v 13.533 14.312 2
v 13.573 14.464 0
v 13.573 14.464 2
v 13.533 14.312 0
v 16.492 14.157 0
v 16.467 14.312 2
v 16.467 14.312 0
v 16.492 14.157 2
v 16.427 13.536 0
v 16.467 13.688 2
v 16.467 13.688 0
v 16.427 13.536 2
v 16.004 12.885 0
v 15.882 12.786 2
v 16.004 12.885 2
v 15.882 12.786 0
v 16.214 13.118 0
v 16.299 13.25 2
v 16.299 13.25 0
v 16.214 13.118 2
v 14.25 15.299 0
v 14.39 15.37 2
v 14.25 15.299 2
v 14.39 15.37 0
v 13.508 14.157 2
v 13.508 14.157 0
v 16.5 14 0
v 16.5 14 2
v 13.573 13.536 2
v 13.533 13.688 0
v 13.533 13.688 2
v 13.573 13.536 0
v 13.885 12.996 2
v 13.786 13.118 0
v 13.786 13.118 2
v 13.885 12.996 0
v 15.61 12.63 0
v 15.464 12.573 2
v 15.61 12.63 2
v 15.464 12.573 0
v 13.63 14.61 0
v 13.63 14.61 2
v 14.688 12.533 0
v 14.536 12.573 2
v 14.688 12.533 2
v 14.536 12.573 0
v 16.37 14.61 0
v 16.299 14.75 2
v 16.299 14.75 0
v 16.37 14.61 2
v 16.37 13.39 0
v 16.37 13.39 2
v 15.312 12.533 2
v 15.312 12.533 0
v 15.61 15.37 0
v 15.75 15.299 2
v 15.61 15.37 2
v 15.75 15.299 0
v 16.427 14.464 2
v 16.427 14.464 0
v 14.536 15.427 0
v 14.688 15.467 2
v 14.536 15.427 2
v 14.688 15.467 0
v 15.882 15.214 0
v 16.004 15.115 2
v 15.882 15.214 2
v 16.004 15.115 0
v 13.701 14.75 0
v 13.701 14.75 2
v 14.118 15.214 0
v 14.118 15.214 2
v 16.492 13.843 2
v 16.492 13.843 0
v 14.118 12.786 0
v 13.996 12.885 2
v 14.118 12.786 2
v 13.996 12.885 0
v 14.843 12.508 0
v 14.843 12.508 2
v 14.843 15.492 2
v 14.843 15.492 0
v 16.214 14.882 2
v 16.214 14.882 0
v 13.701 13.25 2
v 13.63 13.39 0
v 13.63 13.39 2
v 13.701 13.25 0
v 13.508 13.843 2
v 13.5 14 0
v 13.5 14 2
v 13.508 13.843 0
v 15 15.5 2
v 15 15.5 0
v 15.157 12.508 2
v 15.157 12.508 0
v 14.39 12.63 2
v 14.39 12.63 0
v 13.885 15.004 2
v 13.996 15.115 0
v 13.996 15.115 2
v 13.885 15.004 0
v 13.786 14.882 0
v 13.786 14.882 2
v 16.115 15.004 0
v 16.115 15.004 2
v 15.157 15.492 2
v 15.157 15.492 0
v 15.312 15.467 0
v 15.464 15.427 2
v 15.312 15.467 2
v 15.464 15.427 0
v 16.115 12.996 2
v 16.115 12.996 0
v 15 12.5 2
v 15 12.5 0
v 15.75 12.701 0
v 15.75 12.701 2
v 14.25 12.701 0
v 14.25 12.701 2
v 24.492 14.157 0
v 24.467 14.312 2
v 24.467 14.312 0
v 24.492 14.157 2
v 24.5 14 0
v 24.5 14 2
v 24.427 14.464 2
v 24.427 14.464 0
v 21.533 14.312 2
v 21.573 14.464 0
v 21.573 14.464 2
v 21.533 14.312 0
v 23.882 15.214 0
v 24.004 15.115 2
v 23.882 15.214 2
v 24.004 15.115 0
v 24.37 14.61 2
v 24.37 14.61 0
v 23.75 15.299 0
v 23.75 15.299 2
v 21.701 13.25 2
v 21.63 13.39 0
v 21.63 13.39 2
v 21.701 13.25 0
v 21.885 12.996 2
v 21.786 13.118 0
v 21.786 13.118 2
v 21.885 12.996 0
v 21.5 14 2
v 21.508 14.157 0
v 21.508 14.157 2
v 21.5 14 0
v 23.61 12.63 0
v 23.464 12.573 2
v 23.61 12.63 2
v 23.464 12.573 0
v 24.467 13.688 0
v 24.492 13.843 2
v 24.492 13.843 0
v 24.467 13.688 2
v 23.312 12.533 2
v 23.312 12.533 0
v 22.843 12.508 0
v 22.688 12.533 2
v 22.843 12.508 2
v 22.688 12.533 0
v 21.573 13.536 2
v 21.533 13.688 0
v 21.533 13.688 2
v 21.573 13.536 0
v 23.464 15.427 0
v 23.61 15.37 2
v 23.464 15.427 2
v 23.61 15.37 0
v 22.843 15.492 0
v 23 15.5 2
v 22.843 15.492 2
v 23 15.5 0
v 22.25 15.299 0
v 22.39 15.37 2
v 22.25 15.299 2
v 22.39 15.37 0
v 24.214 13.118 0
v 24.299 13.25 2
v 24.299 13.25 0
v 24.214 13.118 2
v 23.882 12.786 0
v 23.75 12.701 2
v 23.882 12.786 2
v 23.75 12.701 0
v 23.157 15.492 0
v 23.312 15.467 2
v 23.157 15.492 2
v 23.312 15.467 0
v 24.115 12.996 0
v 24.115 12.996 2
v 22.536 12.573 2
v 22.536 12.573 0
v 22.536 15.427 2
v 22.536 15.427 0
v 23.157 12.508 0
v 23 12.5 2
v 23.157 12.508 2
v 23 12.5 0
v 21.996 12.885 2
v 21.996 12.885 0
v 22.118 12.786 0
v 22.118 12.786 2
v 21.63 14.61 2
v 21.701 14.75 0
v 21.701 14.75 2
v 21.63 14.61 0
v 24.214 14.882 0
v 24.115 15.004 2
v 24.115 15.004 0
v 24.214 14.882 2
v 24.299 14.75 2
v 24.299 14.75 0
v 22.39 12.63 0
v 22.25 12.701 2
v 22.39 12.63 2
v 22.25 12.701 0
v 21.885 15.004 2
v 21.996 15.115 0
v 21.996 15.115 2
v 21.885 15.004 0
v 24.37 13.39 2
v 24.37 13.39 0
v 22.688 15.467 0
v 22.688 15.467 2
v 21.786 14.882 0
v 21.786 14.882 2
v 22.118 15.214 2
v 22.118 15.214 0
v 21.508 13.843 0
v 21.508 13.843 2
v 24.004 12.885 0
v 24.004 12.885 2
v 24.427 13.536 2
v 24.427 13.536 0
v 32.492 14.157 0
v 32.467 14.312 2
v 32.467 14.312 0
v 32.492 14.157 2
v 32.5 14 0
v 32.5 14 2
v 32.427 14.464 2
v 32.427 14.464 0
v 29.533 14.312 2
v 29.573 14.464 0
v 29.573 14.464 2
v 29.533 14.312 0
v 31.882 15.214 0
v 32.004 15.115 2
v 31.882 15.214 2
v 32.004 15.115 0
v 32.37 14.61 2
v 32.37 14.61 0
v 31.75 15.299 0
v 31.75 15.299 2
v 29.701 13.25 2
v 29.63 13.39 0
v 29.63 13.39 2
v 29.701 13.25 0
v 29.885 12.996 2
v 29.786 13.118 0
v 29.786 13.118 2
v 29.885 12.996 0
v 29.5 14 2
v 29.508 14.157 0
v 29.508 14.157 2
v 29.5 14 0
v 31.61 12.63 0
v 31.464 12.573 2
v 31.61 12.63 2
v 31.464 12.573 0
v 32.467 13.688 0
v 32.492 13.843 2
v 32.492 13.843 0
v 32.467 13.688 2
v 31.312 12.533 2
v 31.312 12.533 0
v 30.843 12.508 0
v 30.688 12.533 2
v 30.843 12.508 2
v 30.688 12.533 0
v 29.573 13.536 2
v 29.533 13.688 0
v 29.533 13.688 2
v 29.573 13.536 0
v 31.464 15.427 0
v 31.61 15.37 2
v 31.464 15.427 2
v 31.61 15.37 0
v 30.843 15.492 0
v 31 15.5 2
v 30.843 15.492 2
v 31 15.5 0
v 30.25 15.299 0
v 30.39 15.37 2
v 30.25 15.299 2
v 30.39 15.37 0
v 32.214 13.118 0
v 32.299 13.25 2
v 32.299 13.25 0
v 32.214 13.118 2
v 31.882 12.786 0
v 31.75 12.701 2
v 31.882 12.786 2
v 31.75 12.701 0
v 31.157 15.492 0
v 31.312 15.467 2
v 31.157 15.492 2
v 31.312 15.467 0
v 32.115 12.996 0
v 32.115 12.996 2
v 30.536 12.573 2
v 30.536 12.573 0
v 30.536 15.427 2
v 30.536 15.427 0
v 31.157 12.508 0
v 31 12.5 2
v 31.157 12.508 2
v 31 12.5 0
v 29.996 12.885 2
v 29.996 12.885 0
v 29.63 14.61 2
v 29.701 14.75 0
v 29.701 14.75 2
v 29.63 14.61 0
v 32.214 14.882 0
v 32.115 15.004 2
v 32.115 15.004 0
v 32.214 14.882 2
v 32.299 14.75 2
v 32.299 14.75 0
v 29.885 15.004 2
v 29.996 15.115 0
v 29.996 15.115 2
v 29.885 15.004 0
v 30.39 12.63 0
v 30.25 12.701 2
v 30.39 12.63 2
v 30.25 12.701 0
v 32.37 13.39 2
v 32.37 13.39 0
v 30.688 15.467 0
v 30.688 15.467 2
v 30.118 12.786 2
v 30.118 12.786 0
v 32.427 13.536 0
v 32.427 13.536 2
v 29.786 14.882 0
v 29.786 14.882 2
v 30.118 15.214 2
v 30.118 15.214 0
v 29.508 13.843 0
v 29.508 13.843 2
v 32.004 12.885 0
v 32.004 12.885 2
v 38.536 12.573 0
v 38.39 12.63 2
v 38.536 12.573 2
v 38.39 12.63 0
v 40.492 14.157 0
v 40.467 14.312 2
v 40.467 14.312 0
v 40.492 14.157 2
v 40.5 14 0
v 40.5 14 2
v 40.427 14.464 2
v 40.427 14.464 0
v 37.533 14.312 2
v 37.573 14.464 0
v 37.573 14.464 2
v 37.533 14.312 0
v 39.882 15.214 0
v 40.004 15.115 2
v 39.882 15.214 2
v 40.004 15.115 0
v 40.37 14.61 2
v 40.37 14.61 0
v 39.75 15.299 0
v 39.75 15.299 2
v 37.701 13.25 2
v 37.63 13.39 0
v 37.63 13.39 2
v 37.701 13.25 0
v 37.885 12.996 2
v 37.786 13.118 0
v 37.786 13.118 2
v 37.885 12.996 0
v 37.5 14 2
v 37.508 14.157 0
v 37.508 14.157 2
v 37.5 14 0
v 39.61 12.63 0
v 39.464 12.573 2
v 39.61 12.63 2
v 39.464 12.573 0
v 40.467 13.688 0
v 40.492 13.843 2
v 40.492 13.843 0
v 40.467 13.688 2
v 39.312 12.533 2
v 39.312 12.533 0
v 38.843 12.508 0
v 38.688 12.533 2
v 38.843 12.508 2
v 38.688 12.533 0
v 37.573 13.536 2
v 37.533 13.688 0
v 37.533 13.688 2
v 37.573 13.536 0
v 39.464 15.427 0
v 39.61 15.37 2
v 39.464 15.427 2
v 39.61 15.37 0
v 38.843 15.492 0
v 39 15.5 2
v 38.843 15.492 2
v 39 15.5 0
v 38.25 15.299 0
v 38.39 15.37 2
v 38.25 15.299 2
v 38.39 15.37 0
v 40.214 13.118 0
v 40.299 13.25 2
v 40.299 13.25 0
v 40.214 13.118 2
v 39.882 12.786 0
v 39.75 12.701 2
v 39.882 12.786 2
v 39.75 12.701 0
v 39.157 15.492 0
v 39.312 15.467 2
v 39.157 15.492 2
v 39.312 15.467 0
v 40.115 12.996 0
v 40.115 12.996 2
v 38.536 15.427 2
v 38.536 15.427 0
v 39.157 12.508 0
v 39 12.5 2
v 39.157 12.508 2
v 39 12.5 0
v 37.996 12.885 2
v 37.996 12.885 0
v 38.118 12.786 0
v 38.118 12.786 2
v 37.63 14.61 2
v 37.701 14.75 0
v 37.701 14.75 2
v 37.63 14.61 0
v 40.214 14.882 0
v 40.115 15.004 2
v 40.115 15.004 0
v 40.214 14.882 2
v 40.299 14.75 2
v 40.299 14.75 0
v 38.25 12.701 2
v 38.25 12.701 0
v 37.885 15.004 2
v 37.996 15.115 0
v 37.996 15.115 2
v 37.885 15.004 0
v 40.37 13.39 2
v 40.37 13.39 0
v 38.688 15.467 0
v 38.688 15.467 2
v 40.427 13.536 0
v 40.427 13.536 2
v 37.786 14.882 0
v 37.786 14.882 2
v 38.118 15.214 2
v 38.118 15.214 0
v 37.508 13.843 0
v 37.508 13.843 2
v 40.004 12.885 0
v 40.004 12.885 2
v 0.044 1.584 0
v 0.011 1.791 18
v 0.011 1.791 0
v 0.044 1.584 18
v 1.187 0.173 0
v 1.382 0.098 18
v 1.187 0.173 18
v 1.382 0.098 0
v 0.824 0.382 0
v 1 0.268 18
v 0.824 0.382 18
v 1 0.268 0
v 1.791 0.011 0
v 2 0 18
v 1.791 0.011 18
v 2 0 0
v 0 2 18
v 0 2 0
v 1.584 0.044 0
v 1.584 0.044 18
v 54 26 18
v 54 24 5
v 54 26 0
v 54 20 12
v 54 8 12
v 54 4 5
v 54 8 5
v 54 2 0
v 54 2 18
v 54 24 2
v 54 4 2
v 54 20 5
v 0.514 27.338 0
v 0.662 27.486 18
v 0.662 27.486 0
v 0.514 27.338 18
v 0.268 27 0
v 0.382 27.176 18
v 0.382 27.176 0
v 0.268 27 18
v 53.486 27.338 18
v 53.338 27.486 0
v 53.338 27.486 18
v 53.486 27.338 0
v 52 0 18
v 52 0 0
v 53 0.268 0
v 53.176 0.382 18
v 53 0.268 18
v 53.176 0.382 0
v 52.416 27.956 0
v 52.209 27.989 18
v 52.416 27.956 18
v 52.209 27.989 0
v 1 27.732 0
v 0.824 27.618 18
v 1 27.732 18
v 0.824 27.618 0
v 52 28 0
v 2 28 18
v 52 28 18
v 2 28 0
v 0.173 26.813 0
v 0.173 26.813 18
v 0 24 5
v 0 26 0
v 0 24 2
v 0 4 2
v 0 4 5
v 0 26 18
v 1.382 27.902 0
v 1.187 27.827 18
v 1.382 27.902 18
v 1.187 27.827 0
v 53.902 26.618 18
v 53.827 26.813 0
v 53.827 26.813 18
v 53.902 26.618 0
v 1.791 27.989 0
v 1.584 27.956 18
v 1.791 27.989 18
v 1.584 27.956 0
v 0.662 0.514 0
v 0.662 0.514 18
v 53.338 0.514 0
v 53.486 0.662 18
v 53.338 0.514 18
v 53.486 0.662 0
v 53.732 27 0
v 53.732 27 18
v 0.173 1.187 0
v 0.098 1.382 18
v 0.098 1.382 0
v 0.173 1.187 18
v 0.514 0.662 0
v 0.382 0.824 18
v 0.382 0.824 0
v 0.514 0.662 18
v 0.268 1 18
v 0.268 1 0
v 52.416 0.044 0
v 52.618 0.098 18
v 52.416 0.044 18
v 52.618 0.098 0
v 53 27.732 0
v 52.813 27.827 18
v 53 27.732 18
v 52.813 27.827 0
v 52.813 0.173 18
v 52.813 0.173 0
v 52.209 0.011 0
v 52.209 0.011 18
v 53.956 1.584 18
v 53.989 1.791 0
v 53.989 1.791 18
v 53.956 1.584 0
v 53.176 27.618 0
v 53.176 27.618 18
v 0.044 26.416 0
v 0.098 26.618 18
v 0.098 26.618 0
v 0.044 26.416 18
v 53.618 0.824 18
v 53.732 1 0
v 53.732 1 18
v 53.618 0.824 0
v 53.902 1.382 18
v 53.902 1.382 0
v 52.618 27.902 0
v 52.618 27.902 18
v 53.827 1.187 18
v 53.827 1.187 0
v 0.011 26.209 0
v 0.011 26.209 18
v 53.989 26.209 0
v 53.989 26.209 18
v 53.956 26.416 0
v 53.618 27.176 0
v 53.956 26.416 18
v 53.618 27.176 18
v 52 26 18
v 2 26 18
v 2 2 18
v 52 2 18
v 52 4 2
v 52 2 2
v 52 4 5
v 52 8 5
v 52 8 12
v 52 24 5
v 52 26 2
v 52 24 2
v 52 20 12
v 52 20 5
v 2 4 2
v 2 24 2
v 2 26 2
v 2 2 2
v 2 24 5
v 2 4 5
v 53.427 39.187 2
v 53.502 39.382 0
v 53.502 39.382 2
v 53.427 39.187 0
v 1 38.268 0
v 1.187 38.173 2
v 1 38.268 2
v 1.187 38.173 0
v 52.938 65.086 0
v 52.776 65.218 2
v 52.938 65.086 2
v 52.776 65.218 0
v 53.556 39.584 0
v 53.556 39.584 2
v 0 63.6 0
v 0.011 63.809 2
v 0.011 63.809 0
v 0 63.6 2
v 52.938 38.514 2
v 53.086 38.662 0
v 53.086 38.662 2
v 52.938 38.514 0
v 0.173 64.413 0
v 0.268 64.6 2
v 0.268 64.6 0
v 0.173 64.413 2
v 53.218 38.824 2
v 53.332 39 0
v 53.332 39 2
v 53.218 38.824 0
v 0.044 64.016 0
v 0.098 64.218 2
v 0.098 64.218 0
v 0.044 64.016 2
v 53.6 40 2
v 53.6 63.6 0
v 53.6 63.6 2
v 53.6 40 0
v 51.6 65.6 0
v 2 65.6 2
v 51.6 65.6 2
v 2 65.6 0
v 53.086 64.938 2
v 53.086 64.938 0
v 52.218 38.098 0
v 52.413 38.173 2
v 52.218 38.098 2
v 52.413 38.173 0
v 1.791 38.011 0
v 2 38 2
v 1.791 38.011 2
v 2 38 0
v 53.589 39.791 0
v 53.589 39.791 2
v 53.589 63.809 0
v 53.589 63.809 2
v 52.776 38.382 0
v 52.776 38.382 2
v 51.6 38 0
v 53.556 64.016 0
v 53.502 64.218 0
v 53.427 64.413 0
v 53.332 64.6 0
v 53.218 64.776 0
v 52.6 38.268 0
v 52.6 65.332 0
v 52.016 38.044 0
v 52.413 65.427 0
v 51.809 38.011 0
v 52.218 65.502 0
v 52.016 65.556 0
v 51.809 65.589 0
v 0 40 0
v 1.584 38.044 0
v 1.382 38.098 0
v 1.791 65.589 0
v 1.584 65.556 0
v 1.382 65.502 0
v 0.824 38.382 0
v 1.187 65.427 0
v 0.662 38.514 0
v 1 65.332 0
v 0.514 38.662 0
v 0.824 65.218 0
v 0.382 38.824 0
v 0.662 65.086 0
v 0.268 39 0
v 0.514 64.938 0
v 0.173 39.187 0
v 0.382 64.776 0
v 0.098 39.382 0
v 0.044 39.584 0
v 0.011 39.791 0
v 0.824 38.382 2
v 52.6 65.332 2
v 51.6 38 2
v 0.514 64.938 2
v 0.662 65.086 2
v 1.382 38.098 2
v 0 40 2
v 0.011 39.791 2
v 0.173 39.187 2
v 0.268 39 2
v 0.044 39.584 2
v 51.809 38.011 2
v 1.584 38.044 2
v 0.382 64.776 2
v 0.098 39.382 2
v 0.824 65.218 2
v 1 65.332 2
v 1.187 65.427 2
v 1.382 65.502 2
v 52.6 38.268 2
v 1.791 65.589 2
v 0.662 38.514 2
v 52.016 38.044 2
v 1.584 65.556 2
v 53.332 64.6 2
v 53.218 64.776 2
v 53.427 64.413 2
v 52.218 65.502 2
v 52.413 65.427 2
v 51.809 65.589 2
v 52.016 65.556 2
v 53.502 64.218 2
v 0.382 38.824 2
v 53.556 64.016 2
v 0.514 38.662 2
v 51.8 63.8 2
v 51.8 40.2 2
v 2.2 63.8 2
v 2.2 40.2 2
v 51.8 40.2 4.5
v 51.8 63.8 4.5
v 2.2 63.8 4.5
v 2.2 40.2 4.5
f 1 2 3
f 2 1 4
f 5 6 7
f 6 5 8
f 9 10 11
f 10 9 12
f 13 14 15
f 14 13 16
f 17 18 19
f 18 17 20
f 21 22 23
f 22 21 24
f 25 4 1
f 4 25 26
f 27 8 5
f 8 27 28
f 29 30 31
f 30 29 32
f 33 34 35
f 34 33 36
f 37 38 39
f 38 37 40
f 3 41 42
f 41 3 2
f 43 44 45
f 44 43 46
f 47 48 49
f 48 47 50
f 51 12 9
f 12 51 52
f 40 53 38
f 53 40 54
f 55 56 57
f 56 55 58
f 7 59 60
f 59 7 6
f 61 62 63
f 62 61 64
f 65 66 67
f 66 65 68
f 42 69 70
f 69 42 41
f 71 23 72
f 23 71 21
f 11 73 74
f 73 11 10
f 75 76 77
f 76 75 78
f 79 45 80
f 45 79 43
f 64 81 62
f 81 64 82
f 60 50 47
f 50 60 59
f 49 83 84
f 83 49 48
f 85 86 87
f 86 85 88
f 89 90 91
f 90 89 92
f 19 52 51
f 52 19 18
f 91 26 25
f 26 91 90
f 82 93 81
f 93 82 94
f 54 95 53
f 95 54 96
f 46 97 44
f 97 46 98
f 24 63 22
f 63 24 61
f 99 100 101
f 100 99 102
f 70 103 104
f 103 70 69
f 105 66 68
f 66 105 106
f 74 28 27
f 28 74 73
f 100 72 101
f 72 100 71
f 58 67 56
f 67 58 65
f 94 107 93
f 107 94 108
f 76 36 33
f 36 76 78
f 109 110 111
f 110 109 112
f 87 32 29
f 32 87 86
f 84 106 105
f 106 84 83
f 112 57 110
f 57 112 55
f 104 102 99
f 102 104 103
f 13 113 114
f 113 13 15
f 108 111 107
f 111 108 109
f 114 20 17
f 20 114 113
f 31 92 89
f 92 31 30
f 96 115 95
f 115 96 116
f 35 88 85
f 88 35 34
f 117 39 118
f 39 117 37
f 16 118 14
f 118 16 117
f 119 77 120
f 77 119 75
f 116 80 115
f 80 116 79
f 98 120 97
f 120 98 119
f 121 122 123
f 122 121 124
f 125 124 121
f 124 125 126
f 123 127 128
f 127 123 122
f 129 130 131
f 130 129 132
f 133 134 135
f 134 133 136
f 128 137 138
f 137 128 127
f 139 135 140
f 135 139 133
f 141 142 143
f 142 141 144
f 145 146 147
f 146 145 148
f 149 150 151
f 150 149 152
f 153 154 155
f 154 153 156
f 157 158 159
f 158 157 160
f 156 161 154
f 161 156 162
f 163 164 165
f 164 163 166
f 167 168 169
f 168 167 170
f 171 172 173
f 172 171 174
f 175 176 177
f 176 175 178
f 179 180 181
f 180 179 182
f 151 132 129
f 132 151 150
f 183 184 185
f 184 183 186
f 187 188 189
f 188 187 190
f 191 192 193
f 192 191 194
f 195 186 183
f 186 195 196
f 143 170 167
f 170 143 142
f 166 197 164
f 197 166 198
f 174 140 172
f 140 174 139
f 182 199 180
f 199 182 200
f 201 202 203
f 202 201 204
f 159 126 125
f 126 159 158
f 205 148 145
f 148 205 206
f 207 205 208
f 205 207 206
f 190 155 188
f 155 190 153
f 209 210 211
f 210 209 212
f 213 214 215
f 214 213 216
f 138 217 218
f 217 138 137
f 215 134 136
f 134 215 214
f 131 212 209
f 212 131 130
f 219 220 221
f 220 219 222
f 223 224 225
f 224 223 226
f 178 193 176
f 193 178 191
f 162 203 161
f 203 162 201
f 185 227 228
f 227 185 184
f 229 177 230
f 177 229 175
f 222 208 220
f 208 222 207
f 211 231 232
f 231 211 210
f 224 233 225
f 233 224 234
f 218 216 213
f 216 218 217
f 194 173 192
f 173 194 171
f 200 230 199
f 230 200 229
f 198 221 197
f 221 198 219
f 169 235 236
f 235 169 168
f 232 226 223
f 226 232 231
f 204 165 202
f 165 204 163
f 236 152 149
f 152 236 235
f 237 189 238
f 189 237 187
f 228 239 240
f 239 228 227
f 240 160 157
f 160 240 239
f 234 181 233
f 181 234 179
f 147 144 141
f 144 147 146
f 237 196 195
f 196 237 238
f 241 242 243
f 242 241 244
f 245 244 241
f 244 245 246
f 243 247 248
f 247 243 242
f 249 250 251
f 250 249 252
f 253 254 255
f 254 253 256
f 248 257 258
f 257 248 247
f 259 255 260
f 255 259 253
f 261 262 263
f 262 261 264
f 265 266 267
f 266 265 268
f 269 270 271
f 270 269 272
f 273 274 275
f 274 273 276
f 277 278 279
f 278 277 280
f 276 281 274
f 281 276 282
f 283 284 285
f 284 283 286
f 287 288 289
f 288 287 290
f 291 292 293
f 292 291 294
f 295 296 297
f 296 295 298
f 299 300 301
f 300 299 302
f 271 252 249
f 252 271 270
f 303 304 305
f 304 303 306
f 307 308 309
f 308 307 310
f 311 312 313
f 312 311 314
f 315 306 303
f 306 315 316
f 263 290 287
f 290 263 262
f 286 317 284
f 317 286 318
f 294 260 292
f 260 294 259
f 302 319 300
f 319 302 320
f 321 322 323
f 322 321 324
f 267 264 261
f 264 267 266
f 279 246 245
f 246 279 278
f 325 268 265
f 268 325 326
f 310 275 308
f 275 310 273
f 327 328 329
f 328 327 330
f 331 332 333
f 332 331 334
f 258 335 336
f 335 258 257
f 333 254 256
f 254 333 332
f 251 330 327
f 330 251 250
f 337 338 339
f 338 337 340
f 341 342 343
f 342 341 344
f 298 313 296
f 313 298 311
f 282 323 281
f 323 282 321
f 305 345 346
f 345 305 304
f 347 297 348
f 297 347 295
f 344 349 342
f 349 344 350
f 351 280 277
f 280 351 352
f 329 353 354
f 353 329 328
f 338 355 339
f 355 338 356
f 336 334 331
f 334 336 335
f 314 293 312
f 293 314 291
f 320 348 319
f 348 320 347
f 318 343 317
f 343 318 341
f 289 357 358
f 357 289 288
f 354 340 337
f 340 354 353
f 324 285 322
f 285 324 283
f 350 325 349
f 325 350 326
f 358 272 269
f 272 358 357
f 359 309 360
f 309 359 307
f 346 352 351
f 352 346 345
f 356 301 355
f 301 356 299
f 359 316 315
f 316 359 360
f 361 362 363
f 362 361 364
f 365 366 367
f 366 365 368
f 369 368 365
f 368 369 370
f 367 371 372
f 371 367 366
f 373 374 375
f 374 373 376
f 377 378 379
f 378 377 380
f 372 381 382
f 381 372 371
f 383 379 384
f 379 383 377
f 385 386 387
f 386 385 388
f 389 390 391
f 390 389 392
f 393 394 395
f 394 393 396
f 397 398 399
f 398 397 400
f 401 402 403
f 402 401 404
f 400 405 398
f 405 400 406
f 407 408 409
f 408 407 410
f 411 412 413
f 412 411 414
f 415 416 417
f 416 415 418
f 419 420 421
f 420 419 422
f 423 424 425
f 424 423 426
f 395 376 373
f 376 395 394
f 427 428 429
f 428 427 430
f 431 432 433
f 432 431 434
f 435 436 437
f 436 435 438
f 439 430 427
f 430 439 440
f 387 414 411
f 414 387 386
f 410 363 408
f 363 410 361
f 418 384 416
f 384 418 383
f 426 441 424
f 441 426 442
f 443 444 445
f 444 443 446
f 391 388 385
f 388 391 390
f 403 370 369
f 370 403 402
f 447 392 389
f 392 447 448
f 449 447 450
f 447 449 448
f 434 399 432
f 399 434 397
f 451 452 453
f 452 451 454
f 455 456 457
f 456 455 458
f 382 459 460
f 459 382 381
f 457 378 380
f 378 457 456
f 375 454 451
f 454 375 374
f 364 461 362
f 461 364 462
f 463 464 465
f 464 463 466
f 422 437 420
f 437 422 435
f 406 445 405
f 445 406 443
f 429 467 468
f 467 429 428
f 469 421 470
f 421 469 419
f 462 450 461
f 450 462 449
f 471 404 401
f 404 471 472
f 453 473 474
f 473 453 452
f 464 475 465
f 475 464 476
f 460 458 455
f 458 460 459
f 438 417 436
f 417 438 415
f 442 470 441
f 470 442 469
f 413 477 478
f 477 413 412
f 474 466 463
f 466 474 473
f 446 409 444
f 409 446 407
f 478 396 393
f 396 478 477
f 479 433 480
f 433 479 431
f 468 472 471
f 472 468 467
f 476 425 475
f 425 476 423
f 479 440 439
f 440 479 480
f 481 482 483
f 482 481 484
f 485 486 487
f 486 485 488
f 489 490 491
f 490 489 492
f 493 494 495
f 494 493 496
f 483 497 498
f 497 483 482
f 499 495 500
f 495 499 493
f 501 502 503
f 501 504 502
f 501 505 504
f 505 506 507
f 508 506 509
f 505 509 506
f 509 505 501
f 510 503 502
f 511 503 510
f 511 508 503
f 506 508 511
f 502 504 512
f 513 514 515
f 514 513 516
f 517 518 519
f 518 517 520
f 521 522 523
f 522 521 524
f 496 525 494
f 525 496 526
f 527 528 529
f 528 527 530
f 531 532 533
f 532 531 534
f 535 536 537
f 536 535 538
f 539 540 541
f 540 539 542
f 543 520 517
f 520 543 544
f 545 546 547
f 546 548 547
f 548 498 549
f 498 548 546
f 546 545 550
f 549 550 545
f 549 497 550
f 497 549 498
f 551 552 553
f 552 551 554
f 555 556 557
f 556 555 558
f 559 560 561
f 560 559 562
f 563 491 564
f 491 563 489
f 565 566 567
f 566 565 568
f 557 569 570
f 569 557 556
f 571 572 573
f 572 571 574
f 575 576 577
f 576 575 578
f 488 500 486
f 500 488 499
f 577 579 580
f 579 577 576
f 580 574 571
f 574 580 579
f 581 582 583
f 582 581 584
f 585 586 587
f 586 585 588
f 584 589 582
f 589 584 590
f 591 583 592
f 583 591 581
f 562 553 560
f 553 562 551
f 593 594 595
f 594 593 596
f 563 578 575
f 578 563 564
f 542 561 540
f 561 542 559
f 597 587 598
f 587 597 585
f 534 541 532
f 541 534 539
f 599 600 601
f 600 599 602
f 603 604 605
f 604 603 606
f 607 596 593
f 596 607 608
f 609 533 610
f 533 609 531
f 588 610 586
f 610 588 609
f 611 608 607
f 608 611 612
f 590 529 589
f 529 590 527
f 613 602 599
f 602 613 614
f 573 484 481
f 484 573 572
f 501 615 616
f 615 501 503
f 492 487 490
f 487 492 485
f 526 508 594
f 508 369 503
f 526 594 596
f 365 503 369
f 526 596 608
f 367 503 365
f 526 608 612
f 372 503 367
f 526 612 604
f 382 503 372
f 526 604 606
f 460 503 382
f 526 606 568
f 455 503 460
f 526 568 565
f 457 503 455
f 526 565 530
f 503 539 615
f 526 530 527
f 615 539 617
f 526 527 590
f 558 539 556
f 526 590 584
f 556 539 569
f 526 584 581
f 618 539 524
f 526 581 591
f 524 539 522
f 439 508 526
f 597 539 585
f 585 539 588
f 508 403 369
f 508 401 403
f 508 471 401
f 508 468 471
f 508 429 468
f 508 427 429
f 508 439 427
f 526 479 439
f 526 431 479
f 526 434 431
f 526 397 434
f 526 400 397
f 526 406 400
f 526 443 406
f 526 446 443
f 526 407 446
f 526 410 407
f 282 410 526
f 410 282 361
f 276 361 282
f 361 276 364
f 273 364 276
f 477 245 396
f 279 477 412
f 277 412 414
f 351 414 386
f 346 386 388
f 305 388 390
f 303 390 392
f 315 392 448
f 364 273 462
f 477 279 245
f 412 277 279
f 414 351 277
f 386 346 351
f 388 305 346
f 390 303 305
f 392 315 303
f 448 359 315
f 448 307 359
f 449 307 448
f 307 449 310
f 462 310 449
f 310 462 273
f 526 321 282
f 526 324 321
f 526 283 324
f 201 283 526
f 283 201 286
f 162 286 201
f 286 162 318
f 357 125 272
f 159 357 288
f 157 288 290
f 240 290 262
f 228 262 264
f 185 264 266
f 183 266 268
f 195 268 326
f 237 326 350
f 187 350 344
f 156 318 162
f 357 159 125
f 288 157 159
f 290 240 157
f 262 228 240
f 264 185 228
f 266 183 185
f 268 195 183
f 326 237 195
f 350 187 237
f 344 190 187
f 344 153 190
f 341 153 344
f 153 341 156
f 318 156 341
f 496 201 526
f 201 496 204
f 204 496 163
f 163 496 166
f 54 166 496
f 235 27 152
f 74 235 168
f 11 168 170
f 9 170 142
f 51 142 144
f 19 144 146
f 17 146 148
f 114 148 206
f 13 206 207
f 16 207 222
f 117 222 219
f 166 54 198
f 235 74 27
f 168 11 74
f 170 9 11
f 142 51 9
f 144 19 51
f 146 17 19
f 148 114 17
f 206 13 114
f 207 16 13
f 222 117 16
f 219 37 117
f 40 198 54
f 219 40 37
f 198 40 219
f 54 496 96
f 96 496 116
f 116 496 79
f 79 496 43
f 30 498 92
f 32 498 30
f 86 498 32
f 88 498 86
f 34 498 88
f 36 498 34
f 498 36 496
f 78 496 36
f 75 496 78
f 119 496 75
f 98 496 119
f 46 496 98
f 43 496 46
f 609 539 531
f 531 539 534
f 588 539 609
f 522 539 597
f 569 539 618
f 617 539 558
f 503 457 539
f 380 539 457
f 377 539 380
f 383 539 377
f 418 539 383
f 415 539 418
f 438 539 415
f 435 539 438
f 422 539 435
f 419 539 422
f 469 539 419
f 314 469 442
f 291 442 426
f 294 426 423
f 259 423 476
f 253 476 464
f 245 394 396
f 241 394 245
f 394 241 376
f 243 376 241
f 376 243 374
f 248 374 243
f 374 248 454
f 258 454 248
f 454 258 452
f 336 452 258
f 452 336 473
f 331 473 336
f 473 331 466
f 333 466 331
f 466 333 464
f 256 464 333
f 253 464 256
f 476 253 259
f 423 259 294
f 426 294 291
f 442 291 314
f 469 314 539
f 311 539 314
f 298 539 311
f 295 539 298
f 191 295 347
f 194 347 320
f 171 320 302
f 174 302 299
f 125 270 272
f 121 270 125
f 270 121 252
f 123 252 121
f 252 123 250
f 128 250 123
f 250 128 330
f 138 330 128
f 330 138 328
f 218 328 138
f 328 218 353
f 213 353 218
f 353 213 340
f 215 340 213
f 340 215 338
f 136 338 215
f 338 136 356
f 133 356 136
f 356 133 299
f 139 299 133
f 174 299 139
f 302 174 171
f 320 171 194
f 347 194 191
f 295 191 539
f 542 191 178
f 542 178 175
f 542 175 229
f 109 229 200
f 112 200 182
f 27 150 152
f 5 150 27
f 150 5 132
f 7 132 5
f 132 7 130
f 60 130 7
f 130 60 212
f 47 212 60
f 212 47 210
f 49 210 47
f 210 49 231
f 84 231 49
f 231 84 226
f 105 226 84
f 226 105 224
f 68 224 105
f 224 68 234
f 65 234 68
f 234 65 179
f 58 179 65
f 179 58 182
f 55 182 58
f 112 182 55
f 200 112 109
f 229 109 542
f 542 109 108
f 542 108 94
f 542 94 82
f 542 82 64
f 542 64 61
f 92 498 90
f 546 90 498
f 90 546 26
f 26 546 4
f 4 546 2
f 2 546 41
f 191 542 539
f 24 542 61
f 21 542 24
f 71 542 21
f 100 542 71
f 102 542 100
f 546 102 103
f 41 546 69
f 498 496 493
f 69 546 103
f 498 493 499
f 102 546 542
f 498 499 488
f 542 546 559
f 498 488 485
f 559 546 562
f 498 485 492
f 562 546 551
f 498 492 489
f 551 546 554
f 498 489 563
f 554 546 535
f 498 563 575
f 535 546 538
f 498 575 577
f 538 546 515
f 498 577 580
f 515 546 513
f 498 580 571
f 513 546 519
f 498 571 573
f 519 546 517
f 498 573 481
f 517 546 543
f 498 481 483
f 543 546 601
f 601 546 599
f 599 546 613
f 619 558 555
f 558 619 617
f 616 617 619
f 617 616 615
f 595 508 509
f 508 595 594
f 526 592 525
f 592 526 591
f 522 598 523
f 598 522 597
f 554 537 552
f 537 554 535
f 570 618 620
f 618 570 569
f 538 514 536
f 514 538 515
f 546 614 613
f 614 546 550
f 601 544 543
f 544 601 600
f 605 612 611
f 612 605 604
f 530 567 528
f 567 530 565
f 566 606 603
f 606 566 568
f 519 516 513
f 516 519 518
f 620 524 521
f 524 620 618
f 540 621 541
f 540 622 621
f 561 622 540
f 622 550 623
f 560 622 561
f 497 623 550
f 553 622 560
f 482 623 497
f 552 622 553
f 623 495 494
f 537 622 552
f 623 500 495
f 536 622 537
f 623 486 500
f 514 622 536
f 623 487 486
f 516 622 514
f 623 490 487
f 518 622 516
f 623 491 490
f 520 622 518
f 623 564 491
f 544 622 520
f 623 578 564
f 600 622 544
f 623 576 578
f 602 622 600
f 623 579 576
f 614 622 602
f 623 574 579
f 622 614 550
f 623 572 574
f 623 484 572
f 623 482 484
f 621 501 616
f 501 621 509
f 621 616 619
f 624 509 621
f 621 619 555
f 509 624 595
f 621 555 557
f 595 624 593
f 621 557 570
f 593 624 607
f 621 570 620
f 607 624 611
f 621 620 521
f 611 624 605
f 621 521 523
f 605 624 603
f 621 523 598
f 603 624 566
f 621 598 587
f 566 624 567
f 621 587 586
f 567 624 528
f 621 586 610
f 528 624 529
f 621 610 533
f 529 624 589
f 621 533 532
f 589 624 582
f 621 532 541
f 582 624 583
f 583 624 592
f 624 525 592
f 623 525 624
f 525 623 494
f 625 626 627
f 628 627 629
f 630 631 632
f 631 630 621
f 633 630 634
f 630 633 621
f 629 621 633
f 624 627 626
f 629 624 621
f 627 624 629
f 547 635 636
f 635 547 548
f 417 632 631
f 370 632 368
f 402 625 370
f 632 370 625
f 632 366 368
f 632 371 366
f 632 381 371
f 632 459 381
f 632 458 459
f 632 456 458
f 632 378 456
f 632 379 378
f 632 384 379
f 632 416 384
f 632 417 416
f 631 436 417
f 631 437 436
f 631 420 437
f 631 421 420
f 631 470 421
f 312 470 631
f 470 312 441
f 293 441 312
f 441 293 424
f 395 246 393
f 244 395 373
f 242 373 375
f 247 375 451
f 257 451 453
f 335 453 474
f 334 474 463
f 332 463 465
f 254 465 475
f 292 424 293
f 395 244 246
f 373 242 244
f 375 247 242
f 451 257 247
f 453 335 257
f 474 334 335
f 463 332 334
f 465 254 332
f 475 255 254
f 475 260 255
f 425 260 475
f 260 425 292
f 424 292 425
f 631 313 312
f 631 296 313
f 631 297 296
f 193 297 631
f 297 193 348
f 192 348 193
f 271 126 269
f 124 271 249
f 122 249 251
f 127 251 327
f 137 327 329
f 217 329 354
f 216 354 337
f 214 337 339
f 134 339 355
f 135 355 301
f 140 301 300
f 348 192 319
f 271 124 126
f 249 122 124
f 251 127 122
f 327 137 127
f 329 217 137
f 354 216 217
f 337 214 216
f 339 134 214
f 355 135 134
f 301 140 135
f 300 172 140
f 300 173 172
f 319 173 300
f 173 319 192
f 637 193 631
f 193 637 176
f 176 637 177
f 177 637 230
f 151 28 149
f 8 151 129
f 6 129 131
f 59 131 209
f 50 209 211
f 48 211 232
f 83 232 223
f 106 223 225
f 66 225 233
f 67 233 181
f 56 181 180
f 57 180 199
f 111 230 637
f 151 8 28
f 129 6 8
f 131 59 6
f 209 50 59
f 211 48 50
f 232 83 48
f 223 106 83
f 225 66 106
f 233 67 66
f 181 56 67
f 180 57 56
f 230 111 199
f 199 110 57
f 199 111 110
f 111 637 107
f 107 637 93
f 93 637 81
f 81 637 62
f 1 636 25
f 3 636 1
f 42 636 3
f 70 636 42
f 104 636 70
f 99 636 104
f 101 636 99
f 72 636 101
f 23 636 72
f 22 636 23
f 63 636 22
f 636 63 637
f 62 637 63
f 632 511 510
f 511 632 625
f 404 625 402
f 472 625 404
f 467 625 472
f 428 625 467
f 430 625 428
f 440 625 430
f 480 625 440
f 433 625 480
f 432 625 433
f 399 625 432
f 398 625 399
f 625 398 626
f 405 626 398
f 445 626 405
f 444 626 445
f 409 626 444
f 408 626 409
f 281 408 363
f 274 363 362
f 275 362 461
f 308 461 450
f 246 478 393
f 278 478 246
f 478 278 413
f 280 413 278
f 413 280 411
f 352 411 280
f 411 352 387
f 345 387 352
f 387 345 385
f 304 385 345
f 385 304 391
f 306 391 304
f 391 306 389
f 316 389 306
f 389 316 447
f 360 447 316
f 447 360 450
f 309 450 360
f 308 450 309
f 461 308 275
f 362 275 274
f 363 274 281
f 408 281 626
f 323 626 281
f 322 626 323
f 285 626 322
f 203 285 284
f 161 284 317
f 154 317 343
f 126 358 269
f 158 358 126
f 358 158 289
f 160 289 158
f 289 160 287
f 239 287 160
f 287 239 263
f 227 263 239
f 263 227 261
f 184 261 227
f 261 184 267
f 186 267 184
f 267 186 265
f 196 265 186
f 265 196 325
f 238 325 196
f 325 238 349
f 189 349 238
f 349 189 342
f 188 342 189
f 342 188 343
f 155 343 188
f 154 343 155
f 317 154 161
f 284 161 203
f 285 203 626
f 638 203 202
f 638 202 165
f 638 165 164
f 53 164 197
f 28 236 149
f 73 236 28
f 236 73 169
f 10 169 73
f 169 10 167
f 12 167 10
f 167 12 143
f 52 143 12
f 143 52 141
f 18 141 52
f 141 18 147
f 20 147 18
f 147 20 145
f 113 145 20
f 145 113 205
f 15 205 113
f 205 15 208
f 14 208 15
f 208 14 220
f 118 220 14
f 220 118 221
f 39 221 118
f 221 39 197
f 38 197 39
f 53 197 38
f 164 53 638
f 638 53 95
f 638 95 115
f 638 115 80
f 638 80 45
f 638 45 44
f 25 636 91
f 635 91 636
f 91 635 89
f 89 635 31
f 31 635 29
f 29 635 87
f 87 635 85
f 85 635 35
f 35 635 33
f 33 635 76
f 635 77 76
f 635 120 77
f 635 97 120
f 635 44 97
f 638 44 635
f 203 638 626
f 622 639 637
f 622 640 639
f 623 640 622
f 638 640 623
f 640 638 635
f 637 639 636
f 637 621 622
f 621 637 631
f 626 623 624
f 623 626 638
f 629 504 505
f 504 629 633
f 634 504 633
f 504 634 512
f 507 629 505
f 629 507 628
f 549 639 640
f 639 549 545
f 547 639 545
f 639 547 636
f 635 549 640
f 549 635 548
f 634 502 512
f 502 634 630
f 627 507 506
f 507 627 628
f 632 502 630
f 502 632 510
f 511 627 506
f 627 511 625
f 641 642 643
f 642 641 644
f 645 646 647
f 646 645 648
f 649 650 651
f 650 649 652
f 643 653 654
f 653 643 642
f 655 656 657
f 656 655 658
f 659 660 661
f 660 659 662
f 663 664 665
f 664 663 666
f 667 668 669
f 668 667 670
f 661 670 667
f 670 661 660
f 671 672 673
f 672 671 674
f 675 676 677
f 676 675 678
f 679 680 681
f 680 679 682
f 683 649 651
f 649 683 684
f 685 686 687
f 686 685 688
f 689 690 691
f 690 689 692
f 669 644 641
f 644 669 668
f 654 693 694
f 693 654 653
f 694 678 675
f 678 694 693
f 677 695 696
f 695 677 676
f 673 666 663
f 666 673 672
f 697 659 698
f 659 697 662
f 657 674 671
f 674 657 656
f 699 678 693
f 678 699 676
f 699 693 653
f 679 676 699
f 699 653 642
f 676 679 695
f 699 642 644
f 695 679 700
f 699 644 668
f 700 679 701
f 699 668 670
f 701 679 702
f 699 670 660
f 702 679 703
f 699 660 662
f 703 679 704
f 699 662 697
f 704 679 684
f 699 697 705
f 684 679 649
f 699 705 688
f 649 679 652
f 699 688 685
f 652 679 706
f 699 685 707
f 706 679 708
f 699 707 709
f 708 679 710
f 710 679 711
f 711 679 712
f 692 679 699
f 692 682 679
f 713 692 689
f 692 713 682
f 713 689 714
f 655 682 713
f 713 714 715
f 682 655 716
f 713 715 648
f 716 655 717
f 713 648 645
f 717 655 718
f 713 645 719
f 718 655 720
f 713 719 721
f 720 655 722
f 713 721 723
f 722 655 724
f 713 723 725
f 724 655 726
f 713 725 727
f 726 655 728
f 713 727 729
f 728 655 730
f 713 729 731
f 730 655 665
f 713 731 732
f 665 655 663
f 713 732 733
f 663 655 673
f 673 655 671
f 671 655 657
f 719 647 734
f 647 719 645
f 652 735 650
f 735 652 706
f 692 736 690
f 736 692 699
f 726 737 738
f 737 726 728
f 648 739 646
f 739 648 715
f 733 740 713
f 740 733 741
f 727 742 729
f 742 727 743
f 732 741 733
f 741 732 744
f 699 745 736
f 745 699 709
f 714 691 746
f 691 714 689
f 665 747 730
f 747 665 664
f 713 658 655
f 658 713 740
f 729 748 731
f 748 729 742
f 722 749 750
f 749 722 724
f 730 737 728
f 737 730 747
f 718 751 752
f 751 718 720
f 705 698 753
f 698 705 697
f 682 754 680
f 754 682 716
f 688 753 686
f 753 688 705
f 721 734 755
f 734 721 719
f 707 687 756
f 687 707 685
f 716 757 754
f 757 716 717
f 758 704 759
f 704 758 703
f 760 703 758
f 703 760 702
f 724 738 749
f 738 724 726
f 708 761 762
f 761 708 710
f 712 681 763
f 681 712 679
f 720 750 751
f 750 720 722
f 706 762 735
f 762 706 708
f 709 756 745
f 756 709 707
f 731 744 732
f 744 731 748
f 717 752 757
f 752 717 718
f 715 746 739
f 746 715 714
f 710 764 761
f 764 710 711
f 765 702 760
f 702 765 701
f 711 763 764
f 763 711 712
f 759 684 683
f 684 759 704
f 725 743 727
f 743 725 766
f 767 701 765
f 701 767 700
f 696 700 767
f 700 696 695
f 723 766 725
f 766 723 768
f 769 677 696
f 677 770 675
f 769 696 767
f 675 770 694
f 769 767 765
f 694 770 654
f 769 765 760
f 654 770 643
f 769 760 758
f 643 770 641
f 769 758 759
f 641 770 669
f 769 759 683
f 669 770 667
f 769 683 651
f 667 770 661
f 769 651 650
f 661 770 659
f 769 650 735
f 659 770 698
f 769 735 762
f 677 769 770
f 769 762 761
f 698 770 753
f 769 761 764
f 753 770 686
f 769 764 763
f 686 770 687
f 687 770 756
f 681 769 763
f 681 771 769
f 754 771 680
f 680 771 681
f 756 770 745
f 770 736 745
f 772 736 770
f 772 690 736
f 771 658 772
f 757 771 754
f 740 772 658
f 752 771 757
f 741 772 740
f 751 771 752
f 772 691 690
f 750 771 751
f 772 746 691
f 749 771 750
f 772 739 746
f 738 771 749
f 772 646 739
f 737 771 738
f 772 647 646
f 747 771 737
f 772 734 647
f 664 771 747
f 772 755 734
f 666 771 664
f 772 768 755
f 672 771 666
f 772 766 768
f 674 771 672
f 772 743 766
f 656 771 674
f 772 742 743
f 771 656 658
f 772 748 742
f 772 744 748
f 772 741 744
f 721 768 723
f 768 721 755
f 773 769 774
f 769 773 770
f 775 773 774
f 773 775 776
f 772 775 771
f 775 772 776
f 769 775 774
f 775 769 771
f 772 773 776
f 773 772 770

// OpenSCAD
// ====================================================================
// BOND TOUCH PROTOTYPE BRACELET ENCLOSURE (OpenSCAD)
// غلاف السوار الذكي للطباعة ثلاثية الأبعاد
// ====================================================================
// Outer dimensions: 54mm x 28mm x 20mm
// Inner clearance: 50mm x 24mm x 16mm (Fits ESP32/Nano 33 + Motor + Battery)
// ====================================================================

$fn = 60; // Smoothness

// PARAMETERS (in mm)
box_length = 54;
box_width  = 28;
box_height = 18;
wall_thick = 2;

usb_width  = 12;
usb_height = 8;

strap_slot_w = 20;
strap_slot_h = 3;

module bracelet_base() {
    difference() {
        // Outer Box Base with rounded corners
        hull() {
            translate([2, 2, 0]) cylinder(r=2, h=box_height);
            translate([box_length-2, 2, 0]) cylinder(r=2, h=box_height);
            translate([2, box_width-2, 0]) cylinder(r=2, h=box_height);
            translate([box_length-2, box_width-2, 0]) cylinder(r=2, h=box_height);
        }

        // Inner Cavity Hollow Out
        translate([wall_thick, wall_thick, wall_thick])
            cube([box_length - (2 * wall_thick), box_width - (2 * wall_thick), box_height]);

        // USB Cable Cutout (Side Wall)
        translate([box_length - wall_thick - 1, (box_width - usb_width)/2, wall_thick + 2])
            cube([wall_thick + 2, usb_width, usb_height]);

        // Wrist Strap Slot Left
        translate([-1, (box_width - strap_slot_w)/2, 2])
            cube([wall_thick + 2, strap_slot_w, strap_slot_h]);

        // Wrist Strap Slot Right
        translate([box_length - wall_thick - 1, (box_width - strap_slot_w)/2, 2])
            cube([wall_thick + 2, strap_slot_w, strap_slot_h]);
            
        // Ventilation holes (Bottom)
        for (i = [15 : 8 : box_length - 15]) {
            translate([i, box_width/2, -1])
                cylinder(r=1.5, h=wall_thick + 2);
        }
    }
}

module bracelet_lid() {
    lid_length = box_length - 0.4;
    lid_width  = box_width - 0.4;
    
    translate([0, box_width + 10, 0]) {
        union() {
            // Main Top Plate
            hull() {
                translate([2, 2, 0]) cylinder(r=2, h=2);
                translate([lid_length-2, 2, 0]) cylinder(r=2, h=2);
                translate([2, lid_width-2, 0]) cylinder(r=2, h=2);
                translate([lid_length-2, lid_width-2, 0]) cylinder(r=2, h=2);
            }
            // Friction-fit lip insertion
            translate([wall_thick + 0.2, wall_thick + 0.2, 2])
                cube([box_length - (2 * wall_thick) - 0.4, box_width - (2 * wall_thick) - 0.4, 2.5]);
        }
    }
}

// Render Base and Lid side-by-side
bracelet_base();
bracelet_lid();
